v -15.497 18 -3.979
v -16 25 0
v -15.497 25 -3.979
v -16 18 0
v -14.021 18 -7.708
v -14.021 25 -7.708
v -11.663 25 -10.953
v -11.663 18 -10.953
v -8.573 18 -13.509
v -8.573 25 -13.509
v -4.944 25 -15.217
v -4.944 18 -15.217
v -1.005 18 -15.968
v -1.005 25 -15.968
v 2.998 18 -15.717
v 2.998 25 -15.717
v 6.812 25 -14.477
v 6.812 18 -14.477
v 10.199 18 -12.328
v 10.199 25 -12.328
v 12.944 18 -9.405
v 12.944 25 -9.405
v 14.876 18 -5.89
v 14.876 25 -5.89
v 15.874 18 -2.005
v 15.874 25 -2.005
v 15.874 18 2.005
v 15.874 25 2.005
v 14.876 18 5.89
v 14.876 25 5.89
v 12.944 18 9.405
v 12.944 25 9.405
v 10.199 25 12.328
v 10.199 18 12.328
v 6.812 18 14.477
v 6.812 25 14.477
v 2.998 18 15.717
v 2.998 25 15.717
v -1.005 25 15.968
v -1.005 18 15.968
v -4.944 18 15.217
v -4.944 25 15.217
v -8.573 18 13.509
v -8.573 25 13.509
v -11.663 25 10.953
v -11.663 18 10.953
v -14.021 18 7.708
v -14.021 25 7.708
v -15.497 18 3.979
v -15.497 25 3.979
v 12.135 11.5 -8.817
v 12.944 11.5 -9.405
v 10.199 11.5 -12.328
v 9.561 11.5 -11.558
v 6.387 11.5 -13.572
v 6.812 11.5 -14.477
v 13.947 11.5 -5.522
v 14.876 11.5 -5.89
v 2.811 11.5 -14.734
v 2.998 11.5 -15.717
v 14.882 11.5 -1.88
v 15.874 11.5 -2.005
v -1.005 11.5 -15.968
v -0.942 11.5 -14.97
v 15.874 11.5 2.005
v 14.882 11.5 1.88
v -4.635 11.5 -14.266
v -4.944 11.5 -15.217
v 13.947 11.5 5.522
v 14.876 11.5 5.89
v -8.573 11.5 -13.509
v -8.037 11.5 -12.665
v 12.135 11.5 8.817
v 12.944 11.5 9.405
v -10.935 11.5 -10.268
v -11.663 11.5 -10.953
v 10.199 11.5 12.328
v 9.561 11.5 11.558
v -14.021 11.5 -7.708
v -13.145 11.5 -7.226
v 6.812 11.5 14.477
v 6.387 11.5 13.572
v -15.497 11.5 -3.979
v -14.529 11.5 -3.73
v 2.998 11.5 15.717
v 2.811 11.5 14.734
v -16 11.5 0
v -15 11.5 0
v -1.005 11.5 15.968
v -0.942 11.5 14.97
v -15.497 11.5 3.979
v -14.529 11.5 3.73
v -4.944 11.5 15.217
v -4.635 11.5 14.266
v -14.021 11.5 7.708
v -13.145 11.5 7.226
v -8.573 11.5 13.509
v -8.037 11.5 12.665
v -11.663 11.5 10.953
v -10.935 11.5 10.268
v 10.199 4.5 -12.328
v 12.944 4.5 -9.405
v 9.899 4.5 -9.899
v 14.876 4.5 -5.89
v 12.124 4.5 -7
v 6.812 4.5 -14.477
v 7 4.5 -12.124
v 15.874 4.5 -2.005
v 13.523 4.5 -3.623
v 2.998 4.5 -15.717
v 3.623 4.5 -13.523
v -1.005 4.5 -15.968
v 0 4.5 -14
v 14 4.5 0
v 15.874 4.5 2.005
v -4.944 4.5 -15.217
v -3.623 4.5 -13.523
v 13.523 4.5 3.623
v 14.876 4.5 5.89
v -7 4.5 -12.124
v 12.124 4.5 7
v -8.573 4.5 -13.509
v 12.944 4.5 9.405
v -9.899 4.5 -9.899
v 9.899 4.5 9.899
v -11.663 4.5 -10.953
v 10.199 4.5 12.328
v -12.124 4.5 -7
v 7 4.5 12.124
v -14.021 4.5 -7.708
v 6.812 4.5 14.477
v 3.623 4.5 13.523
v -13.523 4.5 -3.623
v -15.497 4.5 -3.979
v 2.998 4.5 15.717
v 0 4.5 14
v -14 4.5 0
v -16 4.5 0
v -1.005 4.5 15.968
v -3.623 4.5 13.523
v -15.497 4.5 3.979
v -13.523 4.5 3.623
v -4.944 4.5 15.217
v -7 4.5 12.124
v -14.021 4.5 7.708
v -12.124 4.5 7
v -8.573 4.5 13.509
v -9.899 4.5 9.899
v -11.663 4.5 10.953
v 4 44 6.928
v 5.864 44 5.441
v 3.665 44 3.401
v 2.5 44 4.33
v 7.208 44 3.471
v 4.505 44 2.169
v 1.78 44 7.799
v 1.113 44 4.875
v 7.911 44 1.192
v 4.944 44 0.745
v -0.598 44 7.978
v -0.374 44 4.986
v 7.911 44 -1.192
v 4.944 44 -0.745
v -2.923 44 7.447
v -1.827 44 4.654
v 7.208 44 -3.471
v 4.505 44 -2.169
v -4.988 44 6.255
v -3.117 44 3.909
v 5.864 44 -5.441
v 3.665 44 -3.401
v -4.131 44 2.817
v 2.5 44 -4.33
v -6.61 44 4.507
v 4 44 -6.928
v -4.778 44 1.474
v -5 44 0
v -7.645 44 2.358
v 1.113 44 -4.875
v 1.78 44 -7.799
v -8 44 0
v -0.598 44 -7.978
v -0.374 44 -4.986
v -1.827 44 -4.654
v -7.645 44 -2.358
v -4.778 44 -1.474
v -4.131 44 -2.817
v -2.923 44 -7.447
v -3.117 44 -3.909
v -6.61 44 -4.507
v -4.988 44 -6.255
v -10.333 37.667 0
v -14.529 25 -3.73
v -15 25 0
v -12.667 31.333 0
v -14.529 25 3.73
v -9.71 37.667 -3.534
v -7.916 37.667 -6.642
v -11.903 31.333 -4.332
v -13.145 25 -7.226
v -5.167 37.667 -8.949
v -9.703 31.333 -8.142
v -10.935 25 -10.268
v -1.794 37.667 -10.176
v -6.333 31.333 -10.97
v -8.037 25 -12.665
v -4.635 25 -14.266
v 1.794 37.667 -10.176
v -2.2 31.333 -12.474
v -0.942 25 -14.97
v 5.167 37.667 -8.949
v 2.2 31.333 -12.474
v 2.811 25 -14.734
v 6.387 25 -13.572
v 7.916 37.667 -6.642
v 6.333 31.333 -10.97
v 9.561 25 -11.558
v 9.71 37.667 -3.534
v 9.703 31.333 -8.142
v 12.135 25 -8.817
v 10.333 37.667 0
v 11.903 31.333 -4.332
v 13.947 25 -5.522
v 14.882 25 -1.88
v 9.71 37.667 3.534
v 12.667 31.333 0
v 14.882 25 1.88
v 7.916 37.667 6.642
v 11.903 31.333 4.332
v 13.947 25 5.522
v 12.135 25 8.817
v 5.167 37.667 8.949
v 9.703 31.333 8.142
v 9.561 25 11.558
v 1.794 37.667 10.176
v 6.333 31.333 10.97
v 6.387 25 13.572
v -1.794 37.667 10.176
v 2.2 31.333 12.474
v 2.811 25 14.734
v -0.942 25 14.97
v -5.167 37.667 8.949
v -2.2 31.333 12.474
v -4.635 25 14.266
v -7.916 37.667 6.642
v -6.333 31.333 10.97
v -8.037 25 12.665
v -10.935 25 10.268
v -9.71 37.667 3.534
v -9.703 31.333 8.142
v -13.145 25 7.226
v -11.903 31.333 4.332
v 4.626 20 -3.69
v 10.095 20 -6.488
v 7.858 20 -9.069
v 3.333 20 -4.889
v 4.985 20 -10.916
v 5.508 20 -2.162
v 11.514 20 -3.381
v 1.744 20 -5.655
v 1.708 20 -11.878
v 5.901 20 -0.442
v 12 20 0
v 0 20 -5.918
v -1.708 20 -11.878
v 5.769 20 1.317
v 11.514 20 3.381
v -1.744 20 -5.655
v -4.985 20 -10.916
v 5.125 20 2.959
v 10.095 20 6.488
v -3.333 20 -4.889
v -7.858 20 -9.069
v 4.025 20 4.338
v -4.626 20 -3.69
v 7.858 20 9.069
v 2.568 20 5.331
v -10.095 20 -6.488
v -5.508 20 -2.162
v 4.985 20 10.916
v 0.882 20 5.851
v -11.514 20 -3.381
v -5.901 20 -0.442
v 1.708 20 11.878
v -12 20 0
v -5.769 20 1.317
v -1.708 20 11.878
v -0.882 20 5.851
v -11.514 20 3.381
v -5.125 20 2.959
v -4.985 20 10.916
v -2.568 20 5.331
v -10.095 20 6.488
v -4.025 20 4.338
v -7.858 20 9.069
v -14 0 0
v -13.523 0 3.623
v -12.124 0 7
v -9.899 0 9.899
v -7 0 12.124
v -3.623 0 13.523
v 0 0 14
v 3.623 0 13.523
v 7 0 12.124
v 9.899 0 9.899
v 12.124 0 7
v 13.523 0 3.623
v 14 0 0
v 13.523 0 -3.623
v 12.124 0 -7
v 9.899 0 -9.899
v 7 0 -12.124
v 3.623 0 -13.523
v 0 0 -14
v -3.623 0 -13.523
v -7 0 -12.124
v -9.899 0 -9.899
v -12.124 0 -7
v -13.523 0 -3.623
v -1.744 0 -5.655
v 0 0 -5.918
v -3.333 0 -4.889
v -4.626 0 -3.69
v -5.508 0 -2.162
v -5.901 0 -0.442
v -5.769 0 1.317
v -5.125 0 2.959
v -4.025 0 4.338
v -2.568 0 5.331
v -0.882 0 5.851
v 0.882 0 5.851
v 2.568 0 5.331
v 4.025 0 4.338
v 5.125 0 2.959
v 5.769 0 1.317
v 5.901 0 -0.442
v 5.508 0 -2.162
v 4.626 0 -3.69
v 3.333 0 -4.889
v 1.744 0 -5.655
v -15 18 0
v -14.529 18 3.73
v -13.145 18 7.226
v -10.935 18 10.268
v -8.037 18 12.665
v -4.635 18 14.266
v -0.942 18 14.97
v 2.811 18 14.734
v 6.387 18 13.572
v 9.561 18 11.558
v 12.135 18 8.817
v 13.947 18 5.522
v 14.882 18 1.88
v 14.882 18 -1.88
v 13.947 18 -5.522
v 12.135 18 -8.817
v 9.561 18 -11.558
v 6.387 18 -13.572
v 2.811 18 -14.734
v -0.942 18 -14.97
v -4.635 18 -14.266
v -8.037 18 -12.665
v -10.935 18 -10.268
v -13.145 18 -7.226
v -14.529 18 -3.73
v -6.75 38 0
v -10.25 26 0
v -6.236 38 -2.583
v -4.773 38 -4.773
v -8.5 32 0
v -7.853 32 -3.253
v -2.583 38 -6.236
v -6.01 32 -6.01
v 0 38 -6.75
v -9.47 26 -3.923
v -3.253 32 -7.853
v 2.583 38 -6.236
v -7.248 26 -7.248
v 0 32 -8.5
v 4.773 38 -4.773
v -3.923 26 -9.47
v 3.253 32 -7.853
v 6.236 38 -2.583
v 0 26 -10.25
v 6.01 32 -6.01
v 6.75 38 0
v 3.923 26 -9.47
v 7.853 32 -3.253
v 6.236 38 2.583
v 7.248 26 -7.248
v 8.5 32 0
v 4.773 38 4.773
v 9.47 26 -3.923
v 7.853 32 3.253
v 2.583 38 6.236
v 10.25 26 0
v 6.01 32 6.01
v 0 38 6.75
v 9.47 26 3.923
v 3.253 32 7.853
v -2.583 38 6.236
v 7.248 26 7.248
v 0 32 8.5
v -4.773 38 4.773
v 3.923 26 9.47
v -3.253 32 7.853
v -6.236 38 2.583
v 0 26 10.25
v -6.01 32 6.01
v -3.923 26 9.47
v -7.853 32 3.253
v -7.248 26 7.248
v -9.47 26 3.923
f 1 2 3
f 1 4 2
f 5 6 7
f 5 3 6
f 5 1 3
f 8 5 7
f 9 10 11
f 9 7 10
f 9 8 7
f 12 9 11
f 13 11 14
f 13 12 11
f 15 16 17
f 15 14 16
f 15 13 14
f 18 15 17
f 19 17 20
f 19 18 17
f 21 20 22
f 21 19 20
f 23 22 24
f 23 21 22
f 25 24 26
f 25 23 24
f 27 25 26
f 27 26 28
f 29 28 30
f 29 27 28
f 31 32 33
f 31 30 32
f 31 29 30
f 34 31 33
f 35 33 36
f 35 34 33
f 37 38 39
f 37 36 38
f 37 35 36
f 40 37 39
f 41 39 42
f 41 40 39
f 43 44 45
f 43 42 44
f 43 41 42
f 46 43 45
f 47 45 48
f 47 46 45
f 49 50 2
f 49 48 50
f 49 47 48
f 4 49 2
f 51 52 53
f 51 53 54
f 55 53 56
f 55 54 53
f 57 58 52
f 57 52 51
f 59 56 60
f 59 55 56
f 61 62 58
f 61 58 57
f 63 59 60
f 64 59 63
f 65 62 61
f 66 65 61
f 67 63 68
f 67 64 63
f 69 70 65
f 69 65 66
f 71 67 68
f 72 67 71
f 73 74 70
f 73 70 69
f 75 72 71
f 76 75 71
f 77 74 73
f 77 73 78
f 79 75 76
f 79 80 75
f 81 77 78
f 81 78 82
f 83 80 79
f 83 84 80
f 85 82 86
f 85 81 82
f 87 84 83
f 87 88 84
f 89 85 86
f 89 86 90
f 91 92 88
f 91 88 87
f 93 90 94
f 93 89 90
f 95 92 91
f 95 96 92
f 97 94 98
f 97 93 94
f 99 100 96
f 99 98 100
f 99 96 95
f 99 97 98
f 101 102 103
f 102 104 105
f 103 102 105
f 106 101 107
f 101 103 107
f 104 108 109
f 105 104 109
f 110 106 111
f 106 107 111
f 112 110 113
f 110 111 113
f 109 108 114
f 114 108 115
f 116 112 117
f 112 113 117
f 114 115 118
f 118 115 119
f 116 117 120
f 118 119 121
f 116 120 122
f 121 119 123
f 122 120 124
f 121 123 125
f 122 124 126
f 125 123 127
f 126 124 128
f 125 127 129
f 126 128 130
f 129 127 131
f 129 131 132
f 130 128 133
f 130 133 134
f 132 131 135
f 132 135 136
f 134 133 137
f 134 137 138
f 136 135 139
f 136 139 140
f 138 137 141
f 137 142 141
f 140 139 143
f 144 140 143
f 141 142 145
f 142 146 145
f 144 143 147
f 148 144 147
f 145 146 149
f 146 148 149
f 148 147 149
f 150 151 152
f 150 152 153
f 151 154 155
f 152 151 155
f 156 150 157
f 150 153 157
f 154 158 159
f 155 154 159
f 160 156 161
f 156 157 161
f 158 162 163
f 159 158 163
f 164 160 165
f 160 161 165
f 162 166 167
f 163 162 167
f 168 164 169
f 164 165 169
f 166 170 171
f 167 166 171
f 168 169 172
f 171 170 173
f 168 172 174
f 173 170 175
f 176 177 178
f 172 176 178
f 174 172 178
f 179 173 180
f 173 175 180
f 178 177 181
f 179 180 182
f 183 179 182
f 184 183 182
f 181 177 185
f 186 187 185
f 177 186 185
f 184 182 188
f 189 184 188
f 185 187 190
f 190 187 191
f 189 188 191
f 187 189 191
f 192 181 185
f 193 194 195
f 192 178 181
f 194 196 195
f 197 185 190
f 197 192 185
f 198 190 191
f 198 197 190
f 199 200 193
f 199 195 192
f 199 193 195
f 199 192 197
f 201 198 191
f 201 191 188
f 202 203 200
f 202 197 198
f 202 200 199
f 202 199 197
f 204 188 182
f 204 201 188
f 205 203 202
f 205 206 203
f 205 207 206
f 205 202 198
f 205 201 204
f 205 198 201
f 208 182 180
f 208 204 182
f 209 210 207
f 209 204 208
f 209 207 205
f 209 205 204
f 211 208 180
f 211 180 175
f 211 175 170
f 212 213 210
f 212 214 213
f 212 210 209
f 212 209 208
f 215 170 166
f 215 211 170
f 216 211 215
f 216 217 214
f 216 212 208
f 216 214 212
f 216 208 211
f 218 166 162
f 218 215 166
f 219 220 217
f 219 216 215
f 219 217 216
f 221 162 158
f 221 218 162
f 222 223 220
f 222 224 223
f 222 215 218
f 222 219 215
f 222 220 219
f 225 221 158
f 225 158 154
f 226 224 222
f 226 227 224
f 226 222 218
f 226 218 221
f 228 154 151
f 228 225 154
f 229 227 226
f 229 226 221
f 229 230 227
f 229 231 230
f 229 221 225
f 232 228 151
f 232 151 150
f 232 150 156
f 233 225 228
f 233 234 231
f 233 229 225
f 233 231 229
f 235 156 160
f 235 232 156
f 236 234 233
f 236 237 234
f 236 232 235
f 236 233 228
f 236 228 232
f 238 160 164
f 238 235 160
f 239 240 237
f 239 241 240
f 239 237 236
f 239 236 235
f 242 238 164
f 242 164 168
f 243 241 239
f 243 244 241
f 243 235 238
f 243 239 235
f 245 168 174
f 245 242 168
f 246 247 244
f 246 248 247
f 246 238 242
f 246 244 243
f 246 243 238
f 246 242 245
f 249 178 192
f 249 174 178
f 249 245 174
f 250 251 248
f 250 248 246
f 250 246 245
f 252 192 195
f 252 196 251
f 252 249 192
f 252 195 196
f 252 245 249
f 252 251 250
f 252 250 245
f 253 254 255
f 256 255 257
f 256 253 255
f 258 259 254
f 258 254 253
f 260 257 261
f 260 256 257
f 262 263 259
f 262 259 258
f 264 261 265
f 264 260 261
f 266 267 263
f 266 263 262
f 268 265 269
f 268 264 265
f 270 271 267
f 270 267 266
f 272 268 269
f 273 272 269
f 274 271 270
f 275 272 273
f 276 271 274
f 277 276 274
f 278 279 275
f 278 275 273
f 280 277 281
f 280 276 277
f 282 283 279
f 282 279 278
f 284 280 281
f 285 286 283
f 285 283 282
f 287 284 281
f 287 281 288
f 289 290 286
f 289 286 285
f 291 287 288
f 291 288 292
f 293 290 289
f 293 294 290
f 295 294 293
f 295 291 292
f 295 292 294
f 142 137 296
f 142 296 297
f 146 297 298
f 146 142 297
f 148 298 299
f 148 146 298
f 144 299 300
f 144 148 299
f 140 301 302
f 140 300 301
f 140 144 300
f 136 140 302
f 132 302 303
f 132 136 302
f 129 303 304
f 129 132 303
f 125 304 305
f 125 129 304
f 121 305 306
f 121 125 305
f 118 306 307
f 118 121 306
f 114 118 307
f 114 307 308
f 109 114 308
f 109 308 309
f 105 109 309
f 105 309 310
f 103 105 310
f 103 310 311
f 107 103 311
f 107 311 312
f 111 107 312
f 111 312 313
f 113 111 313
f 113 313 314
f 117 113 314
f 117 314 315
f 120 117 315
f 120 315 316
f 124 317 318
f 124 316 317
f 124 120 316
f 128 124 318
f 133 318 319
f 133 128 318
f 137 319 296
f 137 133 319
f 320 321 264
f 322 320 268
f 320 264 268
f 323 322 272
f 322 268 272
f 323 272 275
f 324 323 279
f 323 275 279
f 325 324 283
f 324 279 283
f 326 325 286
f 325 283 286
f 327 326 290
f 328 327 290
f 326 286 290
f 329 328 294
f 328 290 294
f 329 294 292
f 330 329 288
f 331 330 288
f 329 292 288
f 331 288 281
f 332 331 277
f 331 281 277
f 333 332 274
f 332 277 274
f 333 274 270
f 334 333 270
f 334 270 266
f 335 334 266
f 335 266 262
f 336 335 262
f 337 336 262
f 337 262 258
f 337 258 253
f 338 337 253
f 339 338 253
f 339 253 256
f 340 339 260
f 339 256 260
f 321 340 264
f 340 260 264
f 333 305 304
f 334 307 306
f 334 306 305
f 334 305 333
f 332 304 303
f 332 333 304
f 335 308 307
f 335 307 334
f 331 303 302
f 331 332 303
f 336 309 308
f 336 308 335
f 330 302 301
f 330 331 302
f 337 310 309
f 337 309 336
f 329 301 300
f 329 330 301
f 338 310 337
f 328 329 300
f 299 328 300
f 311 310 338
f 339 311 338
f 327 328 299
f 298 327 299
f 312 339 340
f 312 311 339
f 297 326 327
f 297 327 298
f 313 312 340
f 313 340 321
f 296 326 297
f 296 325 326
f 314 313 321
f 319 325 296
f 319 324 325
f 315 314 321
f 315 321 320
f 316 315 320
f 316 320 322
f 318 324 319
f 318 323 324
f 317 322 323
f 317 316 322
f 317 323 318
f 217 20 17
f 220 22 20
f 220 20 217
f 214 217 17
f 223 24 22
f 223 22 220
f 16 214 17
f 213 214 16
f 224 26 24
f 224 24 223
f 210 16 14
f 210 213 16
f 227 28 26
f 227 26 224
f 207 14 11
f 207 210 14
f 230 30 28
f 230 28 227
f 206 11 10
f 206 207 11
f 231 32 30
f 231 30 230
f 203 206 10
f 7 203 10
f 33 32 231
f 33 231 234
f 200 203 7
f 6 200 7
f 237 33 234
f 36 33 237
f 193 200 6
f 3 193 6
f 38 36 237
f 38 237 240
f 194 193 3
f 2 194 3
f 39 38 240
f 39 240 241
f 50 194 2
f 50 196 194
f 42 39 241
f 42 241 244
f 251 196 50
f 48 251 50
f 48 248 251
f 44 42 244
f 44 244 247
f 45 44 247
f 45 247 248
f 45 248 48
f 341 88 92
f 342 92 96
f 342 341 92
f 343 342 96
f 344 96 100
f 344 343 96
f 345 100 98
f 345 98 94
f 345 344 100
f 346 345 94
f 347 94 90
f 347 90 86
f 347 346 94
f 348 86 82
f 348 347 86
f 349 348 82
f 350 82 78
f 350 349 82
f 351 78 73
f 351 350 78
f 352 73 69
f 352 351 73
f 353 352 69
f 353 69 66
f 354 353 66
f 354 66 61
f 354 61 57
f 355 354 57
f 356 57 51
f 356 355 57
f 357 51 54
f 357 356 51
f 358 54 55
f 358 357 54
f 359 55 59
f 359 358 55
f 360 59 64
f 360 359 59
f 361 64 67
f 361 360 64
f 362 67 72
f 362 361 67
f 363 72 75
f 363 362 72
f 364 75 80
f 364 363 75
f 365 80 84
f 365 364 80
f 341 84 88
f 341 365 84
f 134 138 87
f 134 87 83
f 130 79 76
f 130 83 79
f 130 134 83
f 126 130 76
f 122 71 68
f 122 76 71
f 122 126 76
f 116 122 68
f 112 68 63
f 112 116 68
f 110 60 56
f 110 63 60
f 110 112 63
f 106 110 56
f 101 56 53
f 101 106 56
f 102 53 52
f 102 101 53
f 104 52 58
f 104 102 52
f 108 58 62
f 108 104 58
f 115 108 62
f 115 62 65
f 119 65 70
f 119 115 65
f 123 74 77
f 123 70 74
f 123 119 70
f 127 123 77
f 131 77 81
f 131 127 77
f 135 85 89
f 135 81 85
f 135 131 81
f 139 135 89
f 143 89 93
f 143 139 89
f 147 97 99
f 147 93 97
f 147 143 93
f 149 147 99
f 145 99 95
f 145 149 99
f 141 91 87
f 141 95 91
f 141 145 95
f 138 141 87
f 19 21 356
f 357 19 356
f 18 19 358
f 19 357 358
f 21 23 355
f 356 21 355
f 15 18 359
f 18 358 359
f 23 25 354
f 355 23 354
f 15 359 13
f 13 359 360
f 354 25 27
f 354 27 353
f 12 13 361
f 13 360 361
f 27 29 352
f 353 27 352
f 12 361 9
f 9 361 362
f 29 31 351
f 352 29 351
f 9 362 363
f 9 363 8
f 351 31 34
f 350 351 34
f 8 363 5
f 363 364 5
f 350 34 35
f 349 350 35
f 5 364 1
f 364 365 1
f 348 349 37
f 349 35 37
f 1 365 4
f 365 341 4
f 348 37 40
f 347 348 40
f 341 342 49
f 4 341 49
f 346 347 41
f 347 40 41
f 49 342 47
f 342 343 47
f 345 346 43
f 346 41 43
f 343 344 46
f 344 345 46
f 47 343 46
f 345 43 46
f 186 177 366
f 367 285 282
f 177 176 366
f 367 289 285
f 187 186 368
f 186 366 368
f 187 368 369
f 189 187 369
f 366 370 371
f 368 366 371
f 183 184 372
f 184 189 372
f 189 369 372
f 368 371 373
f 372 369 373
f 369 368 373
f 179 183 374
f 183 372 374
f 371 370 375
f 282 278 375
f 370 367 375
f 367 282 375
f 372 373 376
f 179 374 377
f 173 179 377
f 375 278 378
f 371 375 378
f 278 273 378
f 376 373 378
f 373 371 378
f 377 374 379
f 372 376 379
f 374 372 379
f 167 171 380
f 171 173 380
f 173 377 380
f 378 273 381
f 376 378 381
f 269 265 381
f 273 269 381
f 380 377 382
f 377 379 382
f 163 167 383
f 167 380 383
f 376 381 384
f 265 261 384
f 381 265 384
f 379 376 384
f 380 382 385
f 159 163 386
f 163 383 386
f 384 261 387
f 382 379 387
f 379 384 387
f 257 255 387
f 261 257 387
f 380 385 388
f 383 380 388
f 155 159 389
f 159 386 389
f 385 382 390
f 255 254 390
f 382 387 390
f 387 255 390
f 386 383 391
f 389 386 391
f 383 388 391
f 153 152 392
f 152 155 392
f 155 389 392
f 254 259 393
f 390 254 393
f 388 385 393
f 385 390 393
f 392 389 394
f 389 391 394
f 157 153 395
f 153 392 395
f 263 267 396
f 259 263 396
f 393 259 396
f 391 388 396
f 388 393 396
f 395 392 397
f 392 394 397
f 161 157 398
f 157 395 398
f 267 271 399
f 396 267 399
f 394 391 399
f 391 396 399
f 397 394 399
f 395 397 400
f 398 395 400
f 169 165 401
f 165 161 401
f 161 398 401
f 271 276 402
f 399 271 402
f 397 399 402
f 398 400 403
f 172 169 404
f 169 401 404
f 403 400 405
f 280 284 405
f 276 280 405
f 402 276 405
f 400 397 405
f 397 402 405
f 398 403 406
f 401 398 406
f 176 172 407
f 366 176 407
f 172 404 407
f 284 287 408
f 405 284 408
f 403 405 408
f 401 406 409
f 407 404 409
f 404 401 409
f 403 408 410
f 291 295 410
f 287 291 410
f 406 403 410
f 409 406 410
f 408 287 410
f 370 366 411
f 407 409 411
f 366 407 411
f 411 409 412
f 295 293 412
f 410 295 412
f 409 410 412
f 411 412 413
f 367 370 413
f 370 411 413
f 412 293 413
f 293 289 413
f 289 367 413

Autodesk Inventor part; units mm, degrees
ref_plane "YZ Plane" through (0, 0, 0) normal (1, 0, 0) x (0, 1, 0)
ref_plane "XZ Plane" through (0, 0, 0) normal (0, 1, 0) x (-1, 0, 0)
ref_plane "XY Plane" through (0, 0, 0) normal (0, 0, 1) x (1, 0, 0)
sketch "Sketch1" plane through (0, 0, 0) normal (0, 0, 1) x (1, 0, 0)
  line L0 (0, 52.8) -> (0, -8.8) construction
  line L1 (-18, 0) -> (3, 0) construction
  line L2 (-15, 0) -> (0, 0)
  line L3 (-15, 0) -> (-15, 25)
  line L4 (-15, 25) -> (-8, 44)
  line L5 (-8, 44) -> (0, 44)
  line L6 (0, 44) -> (0, 0)
  line L7 (-15, 0) -> (-14, 0)
  line L8 (-14, 0) -> (-14, 4.5)
  line L9 (-14, 4.5) -> (-15, 4.5)
  line L10 (-15, 4.5) -> (-15, 0)
  dimension "d0" = 15
  dimension "d1" = 44
  dimension "d2" = 8
  dimension "d3" = 25
  dimension "d31" = 1
  dimension "d32" = 4.5
revolve "Revolution1" add sketch "Sketch1" angle 360 about axis through (0, 0, 0) along (0, -1, 0)
revolve "Revolution4" cut sketch "Sketch1" angle 360 about axis through (0, 0, 0) along (0, -1, 0) contours L3 L9 L8 L2
sketch "Sketch2" plane through (0, 0, 0) normal (0, 0, 1) x (1, 0, 0)
  line L0 (-8, 44) -> (-15, 25) projected
  line L1 (-8, 44) -> (8, 44) projected
  line L2 (8, 44) -> (15, 25) projected
  line L3 (0, 44) -> (0, 20)
  line L4 (0, 20) -> (-12, 20)
  line L5 (-5, 44) -> (-12, 20)
  line L6 (0, 15.2) -> (0, 48.8) projected
  dimension "d10" = 12
  dimension "d11" = 3
  dimension "d12" = 24
revolve "Revolution2" cut sketch "Sketch2" angle 360 about axis through (0, -10, 0) along (0, 1, 0)
sketch "Sketch3" plane through (0, 0, 0) normal (0, -1, 0) x (1, 0, 0)
  circle A0 centre (0, 0) radius 15 projected
hole "Hole1" at (0, 0, 0) direction (0, 1, 0) diameter 11.835 depth 20 thread size "M14x2" class "6H" standard "ISO Metric profile"
sketch "Sketch4" plane through (0, 0, 0) normal (0, 0, 1) x (1, 0, 0)
  line L0 (-15, 0) -> (15, 0) projected
  line L1 (-15, 25) -> (15, 25) projected
  line L2 (-15, 25) -> (-15, 0)
  line L3 (-15, 25) -> (-16, 25)
  line L4 (-16, 25) -> (-16, 18)
  line L5 (-16, 18) -> (-15, 18)
  line L6 (-15, 18) -> (-15, 25)
  line L7 (-15, 11.5) -> (-16, 11.5)
  line L8 (-16, 11.5) -> (-16, 4.5)
  line L9 (-16, 4.5) -> (-15, 4.5)
  line L10 (-15, 4.5) -> (-15, 11.5)
  line L11 (0, -5) -> (0, 30) projected
  line L12 (15, 4.5) -> (-15, 4.5) projected
  point P0 (-15.5, 11.5)
  point P1 (-15.5, 18)
  point P2 (-15, 8)
  point P3 (-15, 18)
  dimension "d24" = 1
  dimension "d28" = 7
  dimension "d29" = 7
revolve "Revolution3" add sketch "Sketch4" angle 360 about axis through (0, -10, 0) along (0, 1, 0) contours L9 L8 L7 L2 | L5 L4 L3 L2
properties part number "B3OFT4_HF2_kezifuro_Tokmany" material "Stainless Steel"
